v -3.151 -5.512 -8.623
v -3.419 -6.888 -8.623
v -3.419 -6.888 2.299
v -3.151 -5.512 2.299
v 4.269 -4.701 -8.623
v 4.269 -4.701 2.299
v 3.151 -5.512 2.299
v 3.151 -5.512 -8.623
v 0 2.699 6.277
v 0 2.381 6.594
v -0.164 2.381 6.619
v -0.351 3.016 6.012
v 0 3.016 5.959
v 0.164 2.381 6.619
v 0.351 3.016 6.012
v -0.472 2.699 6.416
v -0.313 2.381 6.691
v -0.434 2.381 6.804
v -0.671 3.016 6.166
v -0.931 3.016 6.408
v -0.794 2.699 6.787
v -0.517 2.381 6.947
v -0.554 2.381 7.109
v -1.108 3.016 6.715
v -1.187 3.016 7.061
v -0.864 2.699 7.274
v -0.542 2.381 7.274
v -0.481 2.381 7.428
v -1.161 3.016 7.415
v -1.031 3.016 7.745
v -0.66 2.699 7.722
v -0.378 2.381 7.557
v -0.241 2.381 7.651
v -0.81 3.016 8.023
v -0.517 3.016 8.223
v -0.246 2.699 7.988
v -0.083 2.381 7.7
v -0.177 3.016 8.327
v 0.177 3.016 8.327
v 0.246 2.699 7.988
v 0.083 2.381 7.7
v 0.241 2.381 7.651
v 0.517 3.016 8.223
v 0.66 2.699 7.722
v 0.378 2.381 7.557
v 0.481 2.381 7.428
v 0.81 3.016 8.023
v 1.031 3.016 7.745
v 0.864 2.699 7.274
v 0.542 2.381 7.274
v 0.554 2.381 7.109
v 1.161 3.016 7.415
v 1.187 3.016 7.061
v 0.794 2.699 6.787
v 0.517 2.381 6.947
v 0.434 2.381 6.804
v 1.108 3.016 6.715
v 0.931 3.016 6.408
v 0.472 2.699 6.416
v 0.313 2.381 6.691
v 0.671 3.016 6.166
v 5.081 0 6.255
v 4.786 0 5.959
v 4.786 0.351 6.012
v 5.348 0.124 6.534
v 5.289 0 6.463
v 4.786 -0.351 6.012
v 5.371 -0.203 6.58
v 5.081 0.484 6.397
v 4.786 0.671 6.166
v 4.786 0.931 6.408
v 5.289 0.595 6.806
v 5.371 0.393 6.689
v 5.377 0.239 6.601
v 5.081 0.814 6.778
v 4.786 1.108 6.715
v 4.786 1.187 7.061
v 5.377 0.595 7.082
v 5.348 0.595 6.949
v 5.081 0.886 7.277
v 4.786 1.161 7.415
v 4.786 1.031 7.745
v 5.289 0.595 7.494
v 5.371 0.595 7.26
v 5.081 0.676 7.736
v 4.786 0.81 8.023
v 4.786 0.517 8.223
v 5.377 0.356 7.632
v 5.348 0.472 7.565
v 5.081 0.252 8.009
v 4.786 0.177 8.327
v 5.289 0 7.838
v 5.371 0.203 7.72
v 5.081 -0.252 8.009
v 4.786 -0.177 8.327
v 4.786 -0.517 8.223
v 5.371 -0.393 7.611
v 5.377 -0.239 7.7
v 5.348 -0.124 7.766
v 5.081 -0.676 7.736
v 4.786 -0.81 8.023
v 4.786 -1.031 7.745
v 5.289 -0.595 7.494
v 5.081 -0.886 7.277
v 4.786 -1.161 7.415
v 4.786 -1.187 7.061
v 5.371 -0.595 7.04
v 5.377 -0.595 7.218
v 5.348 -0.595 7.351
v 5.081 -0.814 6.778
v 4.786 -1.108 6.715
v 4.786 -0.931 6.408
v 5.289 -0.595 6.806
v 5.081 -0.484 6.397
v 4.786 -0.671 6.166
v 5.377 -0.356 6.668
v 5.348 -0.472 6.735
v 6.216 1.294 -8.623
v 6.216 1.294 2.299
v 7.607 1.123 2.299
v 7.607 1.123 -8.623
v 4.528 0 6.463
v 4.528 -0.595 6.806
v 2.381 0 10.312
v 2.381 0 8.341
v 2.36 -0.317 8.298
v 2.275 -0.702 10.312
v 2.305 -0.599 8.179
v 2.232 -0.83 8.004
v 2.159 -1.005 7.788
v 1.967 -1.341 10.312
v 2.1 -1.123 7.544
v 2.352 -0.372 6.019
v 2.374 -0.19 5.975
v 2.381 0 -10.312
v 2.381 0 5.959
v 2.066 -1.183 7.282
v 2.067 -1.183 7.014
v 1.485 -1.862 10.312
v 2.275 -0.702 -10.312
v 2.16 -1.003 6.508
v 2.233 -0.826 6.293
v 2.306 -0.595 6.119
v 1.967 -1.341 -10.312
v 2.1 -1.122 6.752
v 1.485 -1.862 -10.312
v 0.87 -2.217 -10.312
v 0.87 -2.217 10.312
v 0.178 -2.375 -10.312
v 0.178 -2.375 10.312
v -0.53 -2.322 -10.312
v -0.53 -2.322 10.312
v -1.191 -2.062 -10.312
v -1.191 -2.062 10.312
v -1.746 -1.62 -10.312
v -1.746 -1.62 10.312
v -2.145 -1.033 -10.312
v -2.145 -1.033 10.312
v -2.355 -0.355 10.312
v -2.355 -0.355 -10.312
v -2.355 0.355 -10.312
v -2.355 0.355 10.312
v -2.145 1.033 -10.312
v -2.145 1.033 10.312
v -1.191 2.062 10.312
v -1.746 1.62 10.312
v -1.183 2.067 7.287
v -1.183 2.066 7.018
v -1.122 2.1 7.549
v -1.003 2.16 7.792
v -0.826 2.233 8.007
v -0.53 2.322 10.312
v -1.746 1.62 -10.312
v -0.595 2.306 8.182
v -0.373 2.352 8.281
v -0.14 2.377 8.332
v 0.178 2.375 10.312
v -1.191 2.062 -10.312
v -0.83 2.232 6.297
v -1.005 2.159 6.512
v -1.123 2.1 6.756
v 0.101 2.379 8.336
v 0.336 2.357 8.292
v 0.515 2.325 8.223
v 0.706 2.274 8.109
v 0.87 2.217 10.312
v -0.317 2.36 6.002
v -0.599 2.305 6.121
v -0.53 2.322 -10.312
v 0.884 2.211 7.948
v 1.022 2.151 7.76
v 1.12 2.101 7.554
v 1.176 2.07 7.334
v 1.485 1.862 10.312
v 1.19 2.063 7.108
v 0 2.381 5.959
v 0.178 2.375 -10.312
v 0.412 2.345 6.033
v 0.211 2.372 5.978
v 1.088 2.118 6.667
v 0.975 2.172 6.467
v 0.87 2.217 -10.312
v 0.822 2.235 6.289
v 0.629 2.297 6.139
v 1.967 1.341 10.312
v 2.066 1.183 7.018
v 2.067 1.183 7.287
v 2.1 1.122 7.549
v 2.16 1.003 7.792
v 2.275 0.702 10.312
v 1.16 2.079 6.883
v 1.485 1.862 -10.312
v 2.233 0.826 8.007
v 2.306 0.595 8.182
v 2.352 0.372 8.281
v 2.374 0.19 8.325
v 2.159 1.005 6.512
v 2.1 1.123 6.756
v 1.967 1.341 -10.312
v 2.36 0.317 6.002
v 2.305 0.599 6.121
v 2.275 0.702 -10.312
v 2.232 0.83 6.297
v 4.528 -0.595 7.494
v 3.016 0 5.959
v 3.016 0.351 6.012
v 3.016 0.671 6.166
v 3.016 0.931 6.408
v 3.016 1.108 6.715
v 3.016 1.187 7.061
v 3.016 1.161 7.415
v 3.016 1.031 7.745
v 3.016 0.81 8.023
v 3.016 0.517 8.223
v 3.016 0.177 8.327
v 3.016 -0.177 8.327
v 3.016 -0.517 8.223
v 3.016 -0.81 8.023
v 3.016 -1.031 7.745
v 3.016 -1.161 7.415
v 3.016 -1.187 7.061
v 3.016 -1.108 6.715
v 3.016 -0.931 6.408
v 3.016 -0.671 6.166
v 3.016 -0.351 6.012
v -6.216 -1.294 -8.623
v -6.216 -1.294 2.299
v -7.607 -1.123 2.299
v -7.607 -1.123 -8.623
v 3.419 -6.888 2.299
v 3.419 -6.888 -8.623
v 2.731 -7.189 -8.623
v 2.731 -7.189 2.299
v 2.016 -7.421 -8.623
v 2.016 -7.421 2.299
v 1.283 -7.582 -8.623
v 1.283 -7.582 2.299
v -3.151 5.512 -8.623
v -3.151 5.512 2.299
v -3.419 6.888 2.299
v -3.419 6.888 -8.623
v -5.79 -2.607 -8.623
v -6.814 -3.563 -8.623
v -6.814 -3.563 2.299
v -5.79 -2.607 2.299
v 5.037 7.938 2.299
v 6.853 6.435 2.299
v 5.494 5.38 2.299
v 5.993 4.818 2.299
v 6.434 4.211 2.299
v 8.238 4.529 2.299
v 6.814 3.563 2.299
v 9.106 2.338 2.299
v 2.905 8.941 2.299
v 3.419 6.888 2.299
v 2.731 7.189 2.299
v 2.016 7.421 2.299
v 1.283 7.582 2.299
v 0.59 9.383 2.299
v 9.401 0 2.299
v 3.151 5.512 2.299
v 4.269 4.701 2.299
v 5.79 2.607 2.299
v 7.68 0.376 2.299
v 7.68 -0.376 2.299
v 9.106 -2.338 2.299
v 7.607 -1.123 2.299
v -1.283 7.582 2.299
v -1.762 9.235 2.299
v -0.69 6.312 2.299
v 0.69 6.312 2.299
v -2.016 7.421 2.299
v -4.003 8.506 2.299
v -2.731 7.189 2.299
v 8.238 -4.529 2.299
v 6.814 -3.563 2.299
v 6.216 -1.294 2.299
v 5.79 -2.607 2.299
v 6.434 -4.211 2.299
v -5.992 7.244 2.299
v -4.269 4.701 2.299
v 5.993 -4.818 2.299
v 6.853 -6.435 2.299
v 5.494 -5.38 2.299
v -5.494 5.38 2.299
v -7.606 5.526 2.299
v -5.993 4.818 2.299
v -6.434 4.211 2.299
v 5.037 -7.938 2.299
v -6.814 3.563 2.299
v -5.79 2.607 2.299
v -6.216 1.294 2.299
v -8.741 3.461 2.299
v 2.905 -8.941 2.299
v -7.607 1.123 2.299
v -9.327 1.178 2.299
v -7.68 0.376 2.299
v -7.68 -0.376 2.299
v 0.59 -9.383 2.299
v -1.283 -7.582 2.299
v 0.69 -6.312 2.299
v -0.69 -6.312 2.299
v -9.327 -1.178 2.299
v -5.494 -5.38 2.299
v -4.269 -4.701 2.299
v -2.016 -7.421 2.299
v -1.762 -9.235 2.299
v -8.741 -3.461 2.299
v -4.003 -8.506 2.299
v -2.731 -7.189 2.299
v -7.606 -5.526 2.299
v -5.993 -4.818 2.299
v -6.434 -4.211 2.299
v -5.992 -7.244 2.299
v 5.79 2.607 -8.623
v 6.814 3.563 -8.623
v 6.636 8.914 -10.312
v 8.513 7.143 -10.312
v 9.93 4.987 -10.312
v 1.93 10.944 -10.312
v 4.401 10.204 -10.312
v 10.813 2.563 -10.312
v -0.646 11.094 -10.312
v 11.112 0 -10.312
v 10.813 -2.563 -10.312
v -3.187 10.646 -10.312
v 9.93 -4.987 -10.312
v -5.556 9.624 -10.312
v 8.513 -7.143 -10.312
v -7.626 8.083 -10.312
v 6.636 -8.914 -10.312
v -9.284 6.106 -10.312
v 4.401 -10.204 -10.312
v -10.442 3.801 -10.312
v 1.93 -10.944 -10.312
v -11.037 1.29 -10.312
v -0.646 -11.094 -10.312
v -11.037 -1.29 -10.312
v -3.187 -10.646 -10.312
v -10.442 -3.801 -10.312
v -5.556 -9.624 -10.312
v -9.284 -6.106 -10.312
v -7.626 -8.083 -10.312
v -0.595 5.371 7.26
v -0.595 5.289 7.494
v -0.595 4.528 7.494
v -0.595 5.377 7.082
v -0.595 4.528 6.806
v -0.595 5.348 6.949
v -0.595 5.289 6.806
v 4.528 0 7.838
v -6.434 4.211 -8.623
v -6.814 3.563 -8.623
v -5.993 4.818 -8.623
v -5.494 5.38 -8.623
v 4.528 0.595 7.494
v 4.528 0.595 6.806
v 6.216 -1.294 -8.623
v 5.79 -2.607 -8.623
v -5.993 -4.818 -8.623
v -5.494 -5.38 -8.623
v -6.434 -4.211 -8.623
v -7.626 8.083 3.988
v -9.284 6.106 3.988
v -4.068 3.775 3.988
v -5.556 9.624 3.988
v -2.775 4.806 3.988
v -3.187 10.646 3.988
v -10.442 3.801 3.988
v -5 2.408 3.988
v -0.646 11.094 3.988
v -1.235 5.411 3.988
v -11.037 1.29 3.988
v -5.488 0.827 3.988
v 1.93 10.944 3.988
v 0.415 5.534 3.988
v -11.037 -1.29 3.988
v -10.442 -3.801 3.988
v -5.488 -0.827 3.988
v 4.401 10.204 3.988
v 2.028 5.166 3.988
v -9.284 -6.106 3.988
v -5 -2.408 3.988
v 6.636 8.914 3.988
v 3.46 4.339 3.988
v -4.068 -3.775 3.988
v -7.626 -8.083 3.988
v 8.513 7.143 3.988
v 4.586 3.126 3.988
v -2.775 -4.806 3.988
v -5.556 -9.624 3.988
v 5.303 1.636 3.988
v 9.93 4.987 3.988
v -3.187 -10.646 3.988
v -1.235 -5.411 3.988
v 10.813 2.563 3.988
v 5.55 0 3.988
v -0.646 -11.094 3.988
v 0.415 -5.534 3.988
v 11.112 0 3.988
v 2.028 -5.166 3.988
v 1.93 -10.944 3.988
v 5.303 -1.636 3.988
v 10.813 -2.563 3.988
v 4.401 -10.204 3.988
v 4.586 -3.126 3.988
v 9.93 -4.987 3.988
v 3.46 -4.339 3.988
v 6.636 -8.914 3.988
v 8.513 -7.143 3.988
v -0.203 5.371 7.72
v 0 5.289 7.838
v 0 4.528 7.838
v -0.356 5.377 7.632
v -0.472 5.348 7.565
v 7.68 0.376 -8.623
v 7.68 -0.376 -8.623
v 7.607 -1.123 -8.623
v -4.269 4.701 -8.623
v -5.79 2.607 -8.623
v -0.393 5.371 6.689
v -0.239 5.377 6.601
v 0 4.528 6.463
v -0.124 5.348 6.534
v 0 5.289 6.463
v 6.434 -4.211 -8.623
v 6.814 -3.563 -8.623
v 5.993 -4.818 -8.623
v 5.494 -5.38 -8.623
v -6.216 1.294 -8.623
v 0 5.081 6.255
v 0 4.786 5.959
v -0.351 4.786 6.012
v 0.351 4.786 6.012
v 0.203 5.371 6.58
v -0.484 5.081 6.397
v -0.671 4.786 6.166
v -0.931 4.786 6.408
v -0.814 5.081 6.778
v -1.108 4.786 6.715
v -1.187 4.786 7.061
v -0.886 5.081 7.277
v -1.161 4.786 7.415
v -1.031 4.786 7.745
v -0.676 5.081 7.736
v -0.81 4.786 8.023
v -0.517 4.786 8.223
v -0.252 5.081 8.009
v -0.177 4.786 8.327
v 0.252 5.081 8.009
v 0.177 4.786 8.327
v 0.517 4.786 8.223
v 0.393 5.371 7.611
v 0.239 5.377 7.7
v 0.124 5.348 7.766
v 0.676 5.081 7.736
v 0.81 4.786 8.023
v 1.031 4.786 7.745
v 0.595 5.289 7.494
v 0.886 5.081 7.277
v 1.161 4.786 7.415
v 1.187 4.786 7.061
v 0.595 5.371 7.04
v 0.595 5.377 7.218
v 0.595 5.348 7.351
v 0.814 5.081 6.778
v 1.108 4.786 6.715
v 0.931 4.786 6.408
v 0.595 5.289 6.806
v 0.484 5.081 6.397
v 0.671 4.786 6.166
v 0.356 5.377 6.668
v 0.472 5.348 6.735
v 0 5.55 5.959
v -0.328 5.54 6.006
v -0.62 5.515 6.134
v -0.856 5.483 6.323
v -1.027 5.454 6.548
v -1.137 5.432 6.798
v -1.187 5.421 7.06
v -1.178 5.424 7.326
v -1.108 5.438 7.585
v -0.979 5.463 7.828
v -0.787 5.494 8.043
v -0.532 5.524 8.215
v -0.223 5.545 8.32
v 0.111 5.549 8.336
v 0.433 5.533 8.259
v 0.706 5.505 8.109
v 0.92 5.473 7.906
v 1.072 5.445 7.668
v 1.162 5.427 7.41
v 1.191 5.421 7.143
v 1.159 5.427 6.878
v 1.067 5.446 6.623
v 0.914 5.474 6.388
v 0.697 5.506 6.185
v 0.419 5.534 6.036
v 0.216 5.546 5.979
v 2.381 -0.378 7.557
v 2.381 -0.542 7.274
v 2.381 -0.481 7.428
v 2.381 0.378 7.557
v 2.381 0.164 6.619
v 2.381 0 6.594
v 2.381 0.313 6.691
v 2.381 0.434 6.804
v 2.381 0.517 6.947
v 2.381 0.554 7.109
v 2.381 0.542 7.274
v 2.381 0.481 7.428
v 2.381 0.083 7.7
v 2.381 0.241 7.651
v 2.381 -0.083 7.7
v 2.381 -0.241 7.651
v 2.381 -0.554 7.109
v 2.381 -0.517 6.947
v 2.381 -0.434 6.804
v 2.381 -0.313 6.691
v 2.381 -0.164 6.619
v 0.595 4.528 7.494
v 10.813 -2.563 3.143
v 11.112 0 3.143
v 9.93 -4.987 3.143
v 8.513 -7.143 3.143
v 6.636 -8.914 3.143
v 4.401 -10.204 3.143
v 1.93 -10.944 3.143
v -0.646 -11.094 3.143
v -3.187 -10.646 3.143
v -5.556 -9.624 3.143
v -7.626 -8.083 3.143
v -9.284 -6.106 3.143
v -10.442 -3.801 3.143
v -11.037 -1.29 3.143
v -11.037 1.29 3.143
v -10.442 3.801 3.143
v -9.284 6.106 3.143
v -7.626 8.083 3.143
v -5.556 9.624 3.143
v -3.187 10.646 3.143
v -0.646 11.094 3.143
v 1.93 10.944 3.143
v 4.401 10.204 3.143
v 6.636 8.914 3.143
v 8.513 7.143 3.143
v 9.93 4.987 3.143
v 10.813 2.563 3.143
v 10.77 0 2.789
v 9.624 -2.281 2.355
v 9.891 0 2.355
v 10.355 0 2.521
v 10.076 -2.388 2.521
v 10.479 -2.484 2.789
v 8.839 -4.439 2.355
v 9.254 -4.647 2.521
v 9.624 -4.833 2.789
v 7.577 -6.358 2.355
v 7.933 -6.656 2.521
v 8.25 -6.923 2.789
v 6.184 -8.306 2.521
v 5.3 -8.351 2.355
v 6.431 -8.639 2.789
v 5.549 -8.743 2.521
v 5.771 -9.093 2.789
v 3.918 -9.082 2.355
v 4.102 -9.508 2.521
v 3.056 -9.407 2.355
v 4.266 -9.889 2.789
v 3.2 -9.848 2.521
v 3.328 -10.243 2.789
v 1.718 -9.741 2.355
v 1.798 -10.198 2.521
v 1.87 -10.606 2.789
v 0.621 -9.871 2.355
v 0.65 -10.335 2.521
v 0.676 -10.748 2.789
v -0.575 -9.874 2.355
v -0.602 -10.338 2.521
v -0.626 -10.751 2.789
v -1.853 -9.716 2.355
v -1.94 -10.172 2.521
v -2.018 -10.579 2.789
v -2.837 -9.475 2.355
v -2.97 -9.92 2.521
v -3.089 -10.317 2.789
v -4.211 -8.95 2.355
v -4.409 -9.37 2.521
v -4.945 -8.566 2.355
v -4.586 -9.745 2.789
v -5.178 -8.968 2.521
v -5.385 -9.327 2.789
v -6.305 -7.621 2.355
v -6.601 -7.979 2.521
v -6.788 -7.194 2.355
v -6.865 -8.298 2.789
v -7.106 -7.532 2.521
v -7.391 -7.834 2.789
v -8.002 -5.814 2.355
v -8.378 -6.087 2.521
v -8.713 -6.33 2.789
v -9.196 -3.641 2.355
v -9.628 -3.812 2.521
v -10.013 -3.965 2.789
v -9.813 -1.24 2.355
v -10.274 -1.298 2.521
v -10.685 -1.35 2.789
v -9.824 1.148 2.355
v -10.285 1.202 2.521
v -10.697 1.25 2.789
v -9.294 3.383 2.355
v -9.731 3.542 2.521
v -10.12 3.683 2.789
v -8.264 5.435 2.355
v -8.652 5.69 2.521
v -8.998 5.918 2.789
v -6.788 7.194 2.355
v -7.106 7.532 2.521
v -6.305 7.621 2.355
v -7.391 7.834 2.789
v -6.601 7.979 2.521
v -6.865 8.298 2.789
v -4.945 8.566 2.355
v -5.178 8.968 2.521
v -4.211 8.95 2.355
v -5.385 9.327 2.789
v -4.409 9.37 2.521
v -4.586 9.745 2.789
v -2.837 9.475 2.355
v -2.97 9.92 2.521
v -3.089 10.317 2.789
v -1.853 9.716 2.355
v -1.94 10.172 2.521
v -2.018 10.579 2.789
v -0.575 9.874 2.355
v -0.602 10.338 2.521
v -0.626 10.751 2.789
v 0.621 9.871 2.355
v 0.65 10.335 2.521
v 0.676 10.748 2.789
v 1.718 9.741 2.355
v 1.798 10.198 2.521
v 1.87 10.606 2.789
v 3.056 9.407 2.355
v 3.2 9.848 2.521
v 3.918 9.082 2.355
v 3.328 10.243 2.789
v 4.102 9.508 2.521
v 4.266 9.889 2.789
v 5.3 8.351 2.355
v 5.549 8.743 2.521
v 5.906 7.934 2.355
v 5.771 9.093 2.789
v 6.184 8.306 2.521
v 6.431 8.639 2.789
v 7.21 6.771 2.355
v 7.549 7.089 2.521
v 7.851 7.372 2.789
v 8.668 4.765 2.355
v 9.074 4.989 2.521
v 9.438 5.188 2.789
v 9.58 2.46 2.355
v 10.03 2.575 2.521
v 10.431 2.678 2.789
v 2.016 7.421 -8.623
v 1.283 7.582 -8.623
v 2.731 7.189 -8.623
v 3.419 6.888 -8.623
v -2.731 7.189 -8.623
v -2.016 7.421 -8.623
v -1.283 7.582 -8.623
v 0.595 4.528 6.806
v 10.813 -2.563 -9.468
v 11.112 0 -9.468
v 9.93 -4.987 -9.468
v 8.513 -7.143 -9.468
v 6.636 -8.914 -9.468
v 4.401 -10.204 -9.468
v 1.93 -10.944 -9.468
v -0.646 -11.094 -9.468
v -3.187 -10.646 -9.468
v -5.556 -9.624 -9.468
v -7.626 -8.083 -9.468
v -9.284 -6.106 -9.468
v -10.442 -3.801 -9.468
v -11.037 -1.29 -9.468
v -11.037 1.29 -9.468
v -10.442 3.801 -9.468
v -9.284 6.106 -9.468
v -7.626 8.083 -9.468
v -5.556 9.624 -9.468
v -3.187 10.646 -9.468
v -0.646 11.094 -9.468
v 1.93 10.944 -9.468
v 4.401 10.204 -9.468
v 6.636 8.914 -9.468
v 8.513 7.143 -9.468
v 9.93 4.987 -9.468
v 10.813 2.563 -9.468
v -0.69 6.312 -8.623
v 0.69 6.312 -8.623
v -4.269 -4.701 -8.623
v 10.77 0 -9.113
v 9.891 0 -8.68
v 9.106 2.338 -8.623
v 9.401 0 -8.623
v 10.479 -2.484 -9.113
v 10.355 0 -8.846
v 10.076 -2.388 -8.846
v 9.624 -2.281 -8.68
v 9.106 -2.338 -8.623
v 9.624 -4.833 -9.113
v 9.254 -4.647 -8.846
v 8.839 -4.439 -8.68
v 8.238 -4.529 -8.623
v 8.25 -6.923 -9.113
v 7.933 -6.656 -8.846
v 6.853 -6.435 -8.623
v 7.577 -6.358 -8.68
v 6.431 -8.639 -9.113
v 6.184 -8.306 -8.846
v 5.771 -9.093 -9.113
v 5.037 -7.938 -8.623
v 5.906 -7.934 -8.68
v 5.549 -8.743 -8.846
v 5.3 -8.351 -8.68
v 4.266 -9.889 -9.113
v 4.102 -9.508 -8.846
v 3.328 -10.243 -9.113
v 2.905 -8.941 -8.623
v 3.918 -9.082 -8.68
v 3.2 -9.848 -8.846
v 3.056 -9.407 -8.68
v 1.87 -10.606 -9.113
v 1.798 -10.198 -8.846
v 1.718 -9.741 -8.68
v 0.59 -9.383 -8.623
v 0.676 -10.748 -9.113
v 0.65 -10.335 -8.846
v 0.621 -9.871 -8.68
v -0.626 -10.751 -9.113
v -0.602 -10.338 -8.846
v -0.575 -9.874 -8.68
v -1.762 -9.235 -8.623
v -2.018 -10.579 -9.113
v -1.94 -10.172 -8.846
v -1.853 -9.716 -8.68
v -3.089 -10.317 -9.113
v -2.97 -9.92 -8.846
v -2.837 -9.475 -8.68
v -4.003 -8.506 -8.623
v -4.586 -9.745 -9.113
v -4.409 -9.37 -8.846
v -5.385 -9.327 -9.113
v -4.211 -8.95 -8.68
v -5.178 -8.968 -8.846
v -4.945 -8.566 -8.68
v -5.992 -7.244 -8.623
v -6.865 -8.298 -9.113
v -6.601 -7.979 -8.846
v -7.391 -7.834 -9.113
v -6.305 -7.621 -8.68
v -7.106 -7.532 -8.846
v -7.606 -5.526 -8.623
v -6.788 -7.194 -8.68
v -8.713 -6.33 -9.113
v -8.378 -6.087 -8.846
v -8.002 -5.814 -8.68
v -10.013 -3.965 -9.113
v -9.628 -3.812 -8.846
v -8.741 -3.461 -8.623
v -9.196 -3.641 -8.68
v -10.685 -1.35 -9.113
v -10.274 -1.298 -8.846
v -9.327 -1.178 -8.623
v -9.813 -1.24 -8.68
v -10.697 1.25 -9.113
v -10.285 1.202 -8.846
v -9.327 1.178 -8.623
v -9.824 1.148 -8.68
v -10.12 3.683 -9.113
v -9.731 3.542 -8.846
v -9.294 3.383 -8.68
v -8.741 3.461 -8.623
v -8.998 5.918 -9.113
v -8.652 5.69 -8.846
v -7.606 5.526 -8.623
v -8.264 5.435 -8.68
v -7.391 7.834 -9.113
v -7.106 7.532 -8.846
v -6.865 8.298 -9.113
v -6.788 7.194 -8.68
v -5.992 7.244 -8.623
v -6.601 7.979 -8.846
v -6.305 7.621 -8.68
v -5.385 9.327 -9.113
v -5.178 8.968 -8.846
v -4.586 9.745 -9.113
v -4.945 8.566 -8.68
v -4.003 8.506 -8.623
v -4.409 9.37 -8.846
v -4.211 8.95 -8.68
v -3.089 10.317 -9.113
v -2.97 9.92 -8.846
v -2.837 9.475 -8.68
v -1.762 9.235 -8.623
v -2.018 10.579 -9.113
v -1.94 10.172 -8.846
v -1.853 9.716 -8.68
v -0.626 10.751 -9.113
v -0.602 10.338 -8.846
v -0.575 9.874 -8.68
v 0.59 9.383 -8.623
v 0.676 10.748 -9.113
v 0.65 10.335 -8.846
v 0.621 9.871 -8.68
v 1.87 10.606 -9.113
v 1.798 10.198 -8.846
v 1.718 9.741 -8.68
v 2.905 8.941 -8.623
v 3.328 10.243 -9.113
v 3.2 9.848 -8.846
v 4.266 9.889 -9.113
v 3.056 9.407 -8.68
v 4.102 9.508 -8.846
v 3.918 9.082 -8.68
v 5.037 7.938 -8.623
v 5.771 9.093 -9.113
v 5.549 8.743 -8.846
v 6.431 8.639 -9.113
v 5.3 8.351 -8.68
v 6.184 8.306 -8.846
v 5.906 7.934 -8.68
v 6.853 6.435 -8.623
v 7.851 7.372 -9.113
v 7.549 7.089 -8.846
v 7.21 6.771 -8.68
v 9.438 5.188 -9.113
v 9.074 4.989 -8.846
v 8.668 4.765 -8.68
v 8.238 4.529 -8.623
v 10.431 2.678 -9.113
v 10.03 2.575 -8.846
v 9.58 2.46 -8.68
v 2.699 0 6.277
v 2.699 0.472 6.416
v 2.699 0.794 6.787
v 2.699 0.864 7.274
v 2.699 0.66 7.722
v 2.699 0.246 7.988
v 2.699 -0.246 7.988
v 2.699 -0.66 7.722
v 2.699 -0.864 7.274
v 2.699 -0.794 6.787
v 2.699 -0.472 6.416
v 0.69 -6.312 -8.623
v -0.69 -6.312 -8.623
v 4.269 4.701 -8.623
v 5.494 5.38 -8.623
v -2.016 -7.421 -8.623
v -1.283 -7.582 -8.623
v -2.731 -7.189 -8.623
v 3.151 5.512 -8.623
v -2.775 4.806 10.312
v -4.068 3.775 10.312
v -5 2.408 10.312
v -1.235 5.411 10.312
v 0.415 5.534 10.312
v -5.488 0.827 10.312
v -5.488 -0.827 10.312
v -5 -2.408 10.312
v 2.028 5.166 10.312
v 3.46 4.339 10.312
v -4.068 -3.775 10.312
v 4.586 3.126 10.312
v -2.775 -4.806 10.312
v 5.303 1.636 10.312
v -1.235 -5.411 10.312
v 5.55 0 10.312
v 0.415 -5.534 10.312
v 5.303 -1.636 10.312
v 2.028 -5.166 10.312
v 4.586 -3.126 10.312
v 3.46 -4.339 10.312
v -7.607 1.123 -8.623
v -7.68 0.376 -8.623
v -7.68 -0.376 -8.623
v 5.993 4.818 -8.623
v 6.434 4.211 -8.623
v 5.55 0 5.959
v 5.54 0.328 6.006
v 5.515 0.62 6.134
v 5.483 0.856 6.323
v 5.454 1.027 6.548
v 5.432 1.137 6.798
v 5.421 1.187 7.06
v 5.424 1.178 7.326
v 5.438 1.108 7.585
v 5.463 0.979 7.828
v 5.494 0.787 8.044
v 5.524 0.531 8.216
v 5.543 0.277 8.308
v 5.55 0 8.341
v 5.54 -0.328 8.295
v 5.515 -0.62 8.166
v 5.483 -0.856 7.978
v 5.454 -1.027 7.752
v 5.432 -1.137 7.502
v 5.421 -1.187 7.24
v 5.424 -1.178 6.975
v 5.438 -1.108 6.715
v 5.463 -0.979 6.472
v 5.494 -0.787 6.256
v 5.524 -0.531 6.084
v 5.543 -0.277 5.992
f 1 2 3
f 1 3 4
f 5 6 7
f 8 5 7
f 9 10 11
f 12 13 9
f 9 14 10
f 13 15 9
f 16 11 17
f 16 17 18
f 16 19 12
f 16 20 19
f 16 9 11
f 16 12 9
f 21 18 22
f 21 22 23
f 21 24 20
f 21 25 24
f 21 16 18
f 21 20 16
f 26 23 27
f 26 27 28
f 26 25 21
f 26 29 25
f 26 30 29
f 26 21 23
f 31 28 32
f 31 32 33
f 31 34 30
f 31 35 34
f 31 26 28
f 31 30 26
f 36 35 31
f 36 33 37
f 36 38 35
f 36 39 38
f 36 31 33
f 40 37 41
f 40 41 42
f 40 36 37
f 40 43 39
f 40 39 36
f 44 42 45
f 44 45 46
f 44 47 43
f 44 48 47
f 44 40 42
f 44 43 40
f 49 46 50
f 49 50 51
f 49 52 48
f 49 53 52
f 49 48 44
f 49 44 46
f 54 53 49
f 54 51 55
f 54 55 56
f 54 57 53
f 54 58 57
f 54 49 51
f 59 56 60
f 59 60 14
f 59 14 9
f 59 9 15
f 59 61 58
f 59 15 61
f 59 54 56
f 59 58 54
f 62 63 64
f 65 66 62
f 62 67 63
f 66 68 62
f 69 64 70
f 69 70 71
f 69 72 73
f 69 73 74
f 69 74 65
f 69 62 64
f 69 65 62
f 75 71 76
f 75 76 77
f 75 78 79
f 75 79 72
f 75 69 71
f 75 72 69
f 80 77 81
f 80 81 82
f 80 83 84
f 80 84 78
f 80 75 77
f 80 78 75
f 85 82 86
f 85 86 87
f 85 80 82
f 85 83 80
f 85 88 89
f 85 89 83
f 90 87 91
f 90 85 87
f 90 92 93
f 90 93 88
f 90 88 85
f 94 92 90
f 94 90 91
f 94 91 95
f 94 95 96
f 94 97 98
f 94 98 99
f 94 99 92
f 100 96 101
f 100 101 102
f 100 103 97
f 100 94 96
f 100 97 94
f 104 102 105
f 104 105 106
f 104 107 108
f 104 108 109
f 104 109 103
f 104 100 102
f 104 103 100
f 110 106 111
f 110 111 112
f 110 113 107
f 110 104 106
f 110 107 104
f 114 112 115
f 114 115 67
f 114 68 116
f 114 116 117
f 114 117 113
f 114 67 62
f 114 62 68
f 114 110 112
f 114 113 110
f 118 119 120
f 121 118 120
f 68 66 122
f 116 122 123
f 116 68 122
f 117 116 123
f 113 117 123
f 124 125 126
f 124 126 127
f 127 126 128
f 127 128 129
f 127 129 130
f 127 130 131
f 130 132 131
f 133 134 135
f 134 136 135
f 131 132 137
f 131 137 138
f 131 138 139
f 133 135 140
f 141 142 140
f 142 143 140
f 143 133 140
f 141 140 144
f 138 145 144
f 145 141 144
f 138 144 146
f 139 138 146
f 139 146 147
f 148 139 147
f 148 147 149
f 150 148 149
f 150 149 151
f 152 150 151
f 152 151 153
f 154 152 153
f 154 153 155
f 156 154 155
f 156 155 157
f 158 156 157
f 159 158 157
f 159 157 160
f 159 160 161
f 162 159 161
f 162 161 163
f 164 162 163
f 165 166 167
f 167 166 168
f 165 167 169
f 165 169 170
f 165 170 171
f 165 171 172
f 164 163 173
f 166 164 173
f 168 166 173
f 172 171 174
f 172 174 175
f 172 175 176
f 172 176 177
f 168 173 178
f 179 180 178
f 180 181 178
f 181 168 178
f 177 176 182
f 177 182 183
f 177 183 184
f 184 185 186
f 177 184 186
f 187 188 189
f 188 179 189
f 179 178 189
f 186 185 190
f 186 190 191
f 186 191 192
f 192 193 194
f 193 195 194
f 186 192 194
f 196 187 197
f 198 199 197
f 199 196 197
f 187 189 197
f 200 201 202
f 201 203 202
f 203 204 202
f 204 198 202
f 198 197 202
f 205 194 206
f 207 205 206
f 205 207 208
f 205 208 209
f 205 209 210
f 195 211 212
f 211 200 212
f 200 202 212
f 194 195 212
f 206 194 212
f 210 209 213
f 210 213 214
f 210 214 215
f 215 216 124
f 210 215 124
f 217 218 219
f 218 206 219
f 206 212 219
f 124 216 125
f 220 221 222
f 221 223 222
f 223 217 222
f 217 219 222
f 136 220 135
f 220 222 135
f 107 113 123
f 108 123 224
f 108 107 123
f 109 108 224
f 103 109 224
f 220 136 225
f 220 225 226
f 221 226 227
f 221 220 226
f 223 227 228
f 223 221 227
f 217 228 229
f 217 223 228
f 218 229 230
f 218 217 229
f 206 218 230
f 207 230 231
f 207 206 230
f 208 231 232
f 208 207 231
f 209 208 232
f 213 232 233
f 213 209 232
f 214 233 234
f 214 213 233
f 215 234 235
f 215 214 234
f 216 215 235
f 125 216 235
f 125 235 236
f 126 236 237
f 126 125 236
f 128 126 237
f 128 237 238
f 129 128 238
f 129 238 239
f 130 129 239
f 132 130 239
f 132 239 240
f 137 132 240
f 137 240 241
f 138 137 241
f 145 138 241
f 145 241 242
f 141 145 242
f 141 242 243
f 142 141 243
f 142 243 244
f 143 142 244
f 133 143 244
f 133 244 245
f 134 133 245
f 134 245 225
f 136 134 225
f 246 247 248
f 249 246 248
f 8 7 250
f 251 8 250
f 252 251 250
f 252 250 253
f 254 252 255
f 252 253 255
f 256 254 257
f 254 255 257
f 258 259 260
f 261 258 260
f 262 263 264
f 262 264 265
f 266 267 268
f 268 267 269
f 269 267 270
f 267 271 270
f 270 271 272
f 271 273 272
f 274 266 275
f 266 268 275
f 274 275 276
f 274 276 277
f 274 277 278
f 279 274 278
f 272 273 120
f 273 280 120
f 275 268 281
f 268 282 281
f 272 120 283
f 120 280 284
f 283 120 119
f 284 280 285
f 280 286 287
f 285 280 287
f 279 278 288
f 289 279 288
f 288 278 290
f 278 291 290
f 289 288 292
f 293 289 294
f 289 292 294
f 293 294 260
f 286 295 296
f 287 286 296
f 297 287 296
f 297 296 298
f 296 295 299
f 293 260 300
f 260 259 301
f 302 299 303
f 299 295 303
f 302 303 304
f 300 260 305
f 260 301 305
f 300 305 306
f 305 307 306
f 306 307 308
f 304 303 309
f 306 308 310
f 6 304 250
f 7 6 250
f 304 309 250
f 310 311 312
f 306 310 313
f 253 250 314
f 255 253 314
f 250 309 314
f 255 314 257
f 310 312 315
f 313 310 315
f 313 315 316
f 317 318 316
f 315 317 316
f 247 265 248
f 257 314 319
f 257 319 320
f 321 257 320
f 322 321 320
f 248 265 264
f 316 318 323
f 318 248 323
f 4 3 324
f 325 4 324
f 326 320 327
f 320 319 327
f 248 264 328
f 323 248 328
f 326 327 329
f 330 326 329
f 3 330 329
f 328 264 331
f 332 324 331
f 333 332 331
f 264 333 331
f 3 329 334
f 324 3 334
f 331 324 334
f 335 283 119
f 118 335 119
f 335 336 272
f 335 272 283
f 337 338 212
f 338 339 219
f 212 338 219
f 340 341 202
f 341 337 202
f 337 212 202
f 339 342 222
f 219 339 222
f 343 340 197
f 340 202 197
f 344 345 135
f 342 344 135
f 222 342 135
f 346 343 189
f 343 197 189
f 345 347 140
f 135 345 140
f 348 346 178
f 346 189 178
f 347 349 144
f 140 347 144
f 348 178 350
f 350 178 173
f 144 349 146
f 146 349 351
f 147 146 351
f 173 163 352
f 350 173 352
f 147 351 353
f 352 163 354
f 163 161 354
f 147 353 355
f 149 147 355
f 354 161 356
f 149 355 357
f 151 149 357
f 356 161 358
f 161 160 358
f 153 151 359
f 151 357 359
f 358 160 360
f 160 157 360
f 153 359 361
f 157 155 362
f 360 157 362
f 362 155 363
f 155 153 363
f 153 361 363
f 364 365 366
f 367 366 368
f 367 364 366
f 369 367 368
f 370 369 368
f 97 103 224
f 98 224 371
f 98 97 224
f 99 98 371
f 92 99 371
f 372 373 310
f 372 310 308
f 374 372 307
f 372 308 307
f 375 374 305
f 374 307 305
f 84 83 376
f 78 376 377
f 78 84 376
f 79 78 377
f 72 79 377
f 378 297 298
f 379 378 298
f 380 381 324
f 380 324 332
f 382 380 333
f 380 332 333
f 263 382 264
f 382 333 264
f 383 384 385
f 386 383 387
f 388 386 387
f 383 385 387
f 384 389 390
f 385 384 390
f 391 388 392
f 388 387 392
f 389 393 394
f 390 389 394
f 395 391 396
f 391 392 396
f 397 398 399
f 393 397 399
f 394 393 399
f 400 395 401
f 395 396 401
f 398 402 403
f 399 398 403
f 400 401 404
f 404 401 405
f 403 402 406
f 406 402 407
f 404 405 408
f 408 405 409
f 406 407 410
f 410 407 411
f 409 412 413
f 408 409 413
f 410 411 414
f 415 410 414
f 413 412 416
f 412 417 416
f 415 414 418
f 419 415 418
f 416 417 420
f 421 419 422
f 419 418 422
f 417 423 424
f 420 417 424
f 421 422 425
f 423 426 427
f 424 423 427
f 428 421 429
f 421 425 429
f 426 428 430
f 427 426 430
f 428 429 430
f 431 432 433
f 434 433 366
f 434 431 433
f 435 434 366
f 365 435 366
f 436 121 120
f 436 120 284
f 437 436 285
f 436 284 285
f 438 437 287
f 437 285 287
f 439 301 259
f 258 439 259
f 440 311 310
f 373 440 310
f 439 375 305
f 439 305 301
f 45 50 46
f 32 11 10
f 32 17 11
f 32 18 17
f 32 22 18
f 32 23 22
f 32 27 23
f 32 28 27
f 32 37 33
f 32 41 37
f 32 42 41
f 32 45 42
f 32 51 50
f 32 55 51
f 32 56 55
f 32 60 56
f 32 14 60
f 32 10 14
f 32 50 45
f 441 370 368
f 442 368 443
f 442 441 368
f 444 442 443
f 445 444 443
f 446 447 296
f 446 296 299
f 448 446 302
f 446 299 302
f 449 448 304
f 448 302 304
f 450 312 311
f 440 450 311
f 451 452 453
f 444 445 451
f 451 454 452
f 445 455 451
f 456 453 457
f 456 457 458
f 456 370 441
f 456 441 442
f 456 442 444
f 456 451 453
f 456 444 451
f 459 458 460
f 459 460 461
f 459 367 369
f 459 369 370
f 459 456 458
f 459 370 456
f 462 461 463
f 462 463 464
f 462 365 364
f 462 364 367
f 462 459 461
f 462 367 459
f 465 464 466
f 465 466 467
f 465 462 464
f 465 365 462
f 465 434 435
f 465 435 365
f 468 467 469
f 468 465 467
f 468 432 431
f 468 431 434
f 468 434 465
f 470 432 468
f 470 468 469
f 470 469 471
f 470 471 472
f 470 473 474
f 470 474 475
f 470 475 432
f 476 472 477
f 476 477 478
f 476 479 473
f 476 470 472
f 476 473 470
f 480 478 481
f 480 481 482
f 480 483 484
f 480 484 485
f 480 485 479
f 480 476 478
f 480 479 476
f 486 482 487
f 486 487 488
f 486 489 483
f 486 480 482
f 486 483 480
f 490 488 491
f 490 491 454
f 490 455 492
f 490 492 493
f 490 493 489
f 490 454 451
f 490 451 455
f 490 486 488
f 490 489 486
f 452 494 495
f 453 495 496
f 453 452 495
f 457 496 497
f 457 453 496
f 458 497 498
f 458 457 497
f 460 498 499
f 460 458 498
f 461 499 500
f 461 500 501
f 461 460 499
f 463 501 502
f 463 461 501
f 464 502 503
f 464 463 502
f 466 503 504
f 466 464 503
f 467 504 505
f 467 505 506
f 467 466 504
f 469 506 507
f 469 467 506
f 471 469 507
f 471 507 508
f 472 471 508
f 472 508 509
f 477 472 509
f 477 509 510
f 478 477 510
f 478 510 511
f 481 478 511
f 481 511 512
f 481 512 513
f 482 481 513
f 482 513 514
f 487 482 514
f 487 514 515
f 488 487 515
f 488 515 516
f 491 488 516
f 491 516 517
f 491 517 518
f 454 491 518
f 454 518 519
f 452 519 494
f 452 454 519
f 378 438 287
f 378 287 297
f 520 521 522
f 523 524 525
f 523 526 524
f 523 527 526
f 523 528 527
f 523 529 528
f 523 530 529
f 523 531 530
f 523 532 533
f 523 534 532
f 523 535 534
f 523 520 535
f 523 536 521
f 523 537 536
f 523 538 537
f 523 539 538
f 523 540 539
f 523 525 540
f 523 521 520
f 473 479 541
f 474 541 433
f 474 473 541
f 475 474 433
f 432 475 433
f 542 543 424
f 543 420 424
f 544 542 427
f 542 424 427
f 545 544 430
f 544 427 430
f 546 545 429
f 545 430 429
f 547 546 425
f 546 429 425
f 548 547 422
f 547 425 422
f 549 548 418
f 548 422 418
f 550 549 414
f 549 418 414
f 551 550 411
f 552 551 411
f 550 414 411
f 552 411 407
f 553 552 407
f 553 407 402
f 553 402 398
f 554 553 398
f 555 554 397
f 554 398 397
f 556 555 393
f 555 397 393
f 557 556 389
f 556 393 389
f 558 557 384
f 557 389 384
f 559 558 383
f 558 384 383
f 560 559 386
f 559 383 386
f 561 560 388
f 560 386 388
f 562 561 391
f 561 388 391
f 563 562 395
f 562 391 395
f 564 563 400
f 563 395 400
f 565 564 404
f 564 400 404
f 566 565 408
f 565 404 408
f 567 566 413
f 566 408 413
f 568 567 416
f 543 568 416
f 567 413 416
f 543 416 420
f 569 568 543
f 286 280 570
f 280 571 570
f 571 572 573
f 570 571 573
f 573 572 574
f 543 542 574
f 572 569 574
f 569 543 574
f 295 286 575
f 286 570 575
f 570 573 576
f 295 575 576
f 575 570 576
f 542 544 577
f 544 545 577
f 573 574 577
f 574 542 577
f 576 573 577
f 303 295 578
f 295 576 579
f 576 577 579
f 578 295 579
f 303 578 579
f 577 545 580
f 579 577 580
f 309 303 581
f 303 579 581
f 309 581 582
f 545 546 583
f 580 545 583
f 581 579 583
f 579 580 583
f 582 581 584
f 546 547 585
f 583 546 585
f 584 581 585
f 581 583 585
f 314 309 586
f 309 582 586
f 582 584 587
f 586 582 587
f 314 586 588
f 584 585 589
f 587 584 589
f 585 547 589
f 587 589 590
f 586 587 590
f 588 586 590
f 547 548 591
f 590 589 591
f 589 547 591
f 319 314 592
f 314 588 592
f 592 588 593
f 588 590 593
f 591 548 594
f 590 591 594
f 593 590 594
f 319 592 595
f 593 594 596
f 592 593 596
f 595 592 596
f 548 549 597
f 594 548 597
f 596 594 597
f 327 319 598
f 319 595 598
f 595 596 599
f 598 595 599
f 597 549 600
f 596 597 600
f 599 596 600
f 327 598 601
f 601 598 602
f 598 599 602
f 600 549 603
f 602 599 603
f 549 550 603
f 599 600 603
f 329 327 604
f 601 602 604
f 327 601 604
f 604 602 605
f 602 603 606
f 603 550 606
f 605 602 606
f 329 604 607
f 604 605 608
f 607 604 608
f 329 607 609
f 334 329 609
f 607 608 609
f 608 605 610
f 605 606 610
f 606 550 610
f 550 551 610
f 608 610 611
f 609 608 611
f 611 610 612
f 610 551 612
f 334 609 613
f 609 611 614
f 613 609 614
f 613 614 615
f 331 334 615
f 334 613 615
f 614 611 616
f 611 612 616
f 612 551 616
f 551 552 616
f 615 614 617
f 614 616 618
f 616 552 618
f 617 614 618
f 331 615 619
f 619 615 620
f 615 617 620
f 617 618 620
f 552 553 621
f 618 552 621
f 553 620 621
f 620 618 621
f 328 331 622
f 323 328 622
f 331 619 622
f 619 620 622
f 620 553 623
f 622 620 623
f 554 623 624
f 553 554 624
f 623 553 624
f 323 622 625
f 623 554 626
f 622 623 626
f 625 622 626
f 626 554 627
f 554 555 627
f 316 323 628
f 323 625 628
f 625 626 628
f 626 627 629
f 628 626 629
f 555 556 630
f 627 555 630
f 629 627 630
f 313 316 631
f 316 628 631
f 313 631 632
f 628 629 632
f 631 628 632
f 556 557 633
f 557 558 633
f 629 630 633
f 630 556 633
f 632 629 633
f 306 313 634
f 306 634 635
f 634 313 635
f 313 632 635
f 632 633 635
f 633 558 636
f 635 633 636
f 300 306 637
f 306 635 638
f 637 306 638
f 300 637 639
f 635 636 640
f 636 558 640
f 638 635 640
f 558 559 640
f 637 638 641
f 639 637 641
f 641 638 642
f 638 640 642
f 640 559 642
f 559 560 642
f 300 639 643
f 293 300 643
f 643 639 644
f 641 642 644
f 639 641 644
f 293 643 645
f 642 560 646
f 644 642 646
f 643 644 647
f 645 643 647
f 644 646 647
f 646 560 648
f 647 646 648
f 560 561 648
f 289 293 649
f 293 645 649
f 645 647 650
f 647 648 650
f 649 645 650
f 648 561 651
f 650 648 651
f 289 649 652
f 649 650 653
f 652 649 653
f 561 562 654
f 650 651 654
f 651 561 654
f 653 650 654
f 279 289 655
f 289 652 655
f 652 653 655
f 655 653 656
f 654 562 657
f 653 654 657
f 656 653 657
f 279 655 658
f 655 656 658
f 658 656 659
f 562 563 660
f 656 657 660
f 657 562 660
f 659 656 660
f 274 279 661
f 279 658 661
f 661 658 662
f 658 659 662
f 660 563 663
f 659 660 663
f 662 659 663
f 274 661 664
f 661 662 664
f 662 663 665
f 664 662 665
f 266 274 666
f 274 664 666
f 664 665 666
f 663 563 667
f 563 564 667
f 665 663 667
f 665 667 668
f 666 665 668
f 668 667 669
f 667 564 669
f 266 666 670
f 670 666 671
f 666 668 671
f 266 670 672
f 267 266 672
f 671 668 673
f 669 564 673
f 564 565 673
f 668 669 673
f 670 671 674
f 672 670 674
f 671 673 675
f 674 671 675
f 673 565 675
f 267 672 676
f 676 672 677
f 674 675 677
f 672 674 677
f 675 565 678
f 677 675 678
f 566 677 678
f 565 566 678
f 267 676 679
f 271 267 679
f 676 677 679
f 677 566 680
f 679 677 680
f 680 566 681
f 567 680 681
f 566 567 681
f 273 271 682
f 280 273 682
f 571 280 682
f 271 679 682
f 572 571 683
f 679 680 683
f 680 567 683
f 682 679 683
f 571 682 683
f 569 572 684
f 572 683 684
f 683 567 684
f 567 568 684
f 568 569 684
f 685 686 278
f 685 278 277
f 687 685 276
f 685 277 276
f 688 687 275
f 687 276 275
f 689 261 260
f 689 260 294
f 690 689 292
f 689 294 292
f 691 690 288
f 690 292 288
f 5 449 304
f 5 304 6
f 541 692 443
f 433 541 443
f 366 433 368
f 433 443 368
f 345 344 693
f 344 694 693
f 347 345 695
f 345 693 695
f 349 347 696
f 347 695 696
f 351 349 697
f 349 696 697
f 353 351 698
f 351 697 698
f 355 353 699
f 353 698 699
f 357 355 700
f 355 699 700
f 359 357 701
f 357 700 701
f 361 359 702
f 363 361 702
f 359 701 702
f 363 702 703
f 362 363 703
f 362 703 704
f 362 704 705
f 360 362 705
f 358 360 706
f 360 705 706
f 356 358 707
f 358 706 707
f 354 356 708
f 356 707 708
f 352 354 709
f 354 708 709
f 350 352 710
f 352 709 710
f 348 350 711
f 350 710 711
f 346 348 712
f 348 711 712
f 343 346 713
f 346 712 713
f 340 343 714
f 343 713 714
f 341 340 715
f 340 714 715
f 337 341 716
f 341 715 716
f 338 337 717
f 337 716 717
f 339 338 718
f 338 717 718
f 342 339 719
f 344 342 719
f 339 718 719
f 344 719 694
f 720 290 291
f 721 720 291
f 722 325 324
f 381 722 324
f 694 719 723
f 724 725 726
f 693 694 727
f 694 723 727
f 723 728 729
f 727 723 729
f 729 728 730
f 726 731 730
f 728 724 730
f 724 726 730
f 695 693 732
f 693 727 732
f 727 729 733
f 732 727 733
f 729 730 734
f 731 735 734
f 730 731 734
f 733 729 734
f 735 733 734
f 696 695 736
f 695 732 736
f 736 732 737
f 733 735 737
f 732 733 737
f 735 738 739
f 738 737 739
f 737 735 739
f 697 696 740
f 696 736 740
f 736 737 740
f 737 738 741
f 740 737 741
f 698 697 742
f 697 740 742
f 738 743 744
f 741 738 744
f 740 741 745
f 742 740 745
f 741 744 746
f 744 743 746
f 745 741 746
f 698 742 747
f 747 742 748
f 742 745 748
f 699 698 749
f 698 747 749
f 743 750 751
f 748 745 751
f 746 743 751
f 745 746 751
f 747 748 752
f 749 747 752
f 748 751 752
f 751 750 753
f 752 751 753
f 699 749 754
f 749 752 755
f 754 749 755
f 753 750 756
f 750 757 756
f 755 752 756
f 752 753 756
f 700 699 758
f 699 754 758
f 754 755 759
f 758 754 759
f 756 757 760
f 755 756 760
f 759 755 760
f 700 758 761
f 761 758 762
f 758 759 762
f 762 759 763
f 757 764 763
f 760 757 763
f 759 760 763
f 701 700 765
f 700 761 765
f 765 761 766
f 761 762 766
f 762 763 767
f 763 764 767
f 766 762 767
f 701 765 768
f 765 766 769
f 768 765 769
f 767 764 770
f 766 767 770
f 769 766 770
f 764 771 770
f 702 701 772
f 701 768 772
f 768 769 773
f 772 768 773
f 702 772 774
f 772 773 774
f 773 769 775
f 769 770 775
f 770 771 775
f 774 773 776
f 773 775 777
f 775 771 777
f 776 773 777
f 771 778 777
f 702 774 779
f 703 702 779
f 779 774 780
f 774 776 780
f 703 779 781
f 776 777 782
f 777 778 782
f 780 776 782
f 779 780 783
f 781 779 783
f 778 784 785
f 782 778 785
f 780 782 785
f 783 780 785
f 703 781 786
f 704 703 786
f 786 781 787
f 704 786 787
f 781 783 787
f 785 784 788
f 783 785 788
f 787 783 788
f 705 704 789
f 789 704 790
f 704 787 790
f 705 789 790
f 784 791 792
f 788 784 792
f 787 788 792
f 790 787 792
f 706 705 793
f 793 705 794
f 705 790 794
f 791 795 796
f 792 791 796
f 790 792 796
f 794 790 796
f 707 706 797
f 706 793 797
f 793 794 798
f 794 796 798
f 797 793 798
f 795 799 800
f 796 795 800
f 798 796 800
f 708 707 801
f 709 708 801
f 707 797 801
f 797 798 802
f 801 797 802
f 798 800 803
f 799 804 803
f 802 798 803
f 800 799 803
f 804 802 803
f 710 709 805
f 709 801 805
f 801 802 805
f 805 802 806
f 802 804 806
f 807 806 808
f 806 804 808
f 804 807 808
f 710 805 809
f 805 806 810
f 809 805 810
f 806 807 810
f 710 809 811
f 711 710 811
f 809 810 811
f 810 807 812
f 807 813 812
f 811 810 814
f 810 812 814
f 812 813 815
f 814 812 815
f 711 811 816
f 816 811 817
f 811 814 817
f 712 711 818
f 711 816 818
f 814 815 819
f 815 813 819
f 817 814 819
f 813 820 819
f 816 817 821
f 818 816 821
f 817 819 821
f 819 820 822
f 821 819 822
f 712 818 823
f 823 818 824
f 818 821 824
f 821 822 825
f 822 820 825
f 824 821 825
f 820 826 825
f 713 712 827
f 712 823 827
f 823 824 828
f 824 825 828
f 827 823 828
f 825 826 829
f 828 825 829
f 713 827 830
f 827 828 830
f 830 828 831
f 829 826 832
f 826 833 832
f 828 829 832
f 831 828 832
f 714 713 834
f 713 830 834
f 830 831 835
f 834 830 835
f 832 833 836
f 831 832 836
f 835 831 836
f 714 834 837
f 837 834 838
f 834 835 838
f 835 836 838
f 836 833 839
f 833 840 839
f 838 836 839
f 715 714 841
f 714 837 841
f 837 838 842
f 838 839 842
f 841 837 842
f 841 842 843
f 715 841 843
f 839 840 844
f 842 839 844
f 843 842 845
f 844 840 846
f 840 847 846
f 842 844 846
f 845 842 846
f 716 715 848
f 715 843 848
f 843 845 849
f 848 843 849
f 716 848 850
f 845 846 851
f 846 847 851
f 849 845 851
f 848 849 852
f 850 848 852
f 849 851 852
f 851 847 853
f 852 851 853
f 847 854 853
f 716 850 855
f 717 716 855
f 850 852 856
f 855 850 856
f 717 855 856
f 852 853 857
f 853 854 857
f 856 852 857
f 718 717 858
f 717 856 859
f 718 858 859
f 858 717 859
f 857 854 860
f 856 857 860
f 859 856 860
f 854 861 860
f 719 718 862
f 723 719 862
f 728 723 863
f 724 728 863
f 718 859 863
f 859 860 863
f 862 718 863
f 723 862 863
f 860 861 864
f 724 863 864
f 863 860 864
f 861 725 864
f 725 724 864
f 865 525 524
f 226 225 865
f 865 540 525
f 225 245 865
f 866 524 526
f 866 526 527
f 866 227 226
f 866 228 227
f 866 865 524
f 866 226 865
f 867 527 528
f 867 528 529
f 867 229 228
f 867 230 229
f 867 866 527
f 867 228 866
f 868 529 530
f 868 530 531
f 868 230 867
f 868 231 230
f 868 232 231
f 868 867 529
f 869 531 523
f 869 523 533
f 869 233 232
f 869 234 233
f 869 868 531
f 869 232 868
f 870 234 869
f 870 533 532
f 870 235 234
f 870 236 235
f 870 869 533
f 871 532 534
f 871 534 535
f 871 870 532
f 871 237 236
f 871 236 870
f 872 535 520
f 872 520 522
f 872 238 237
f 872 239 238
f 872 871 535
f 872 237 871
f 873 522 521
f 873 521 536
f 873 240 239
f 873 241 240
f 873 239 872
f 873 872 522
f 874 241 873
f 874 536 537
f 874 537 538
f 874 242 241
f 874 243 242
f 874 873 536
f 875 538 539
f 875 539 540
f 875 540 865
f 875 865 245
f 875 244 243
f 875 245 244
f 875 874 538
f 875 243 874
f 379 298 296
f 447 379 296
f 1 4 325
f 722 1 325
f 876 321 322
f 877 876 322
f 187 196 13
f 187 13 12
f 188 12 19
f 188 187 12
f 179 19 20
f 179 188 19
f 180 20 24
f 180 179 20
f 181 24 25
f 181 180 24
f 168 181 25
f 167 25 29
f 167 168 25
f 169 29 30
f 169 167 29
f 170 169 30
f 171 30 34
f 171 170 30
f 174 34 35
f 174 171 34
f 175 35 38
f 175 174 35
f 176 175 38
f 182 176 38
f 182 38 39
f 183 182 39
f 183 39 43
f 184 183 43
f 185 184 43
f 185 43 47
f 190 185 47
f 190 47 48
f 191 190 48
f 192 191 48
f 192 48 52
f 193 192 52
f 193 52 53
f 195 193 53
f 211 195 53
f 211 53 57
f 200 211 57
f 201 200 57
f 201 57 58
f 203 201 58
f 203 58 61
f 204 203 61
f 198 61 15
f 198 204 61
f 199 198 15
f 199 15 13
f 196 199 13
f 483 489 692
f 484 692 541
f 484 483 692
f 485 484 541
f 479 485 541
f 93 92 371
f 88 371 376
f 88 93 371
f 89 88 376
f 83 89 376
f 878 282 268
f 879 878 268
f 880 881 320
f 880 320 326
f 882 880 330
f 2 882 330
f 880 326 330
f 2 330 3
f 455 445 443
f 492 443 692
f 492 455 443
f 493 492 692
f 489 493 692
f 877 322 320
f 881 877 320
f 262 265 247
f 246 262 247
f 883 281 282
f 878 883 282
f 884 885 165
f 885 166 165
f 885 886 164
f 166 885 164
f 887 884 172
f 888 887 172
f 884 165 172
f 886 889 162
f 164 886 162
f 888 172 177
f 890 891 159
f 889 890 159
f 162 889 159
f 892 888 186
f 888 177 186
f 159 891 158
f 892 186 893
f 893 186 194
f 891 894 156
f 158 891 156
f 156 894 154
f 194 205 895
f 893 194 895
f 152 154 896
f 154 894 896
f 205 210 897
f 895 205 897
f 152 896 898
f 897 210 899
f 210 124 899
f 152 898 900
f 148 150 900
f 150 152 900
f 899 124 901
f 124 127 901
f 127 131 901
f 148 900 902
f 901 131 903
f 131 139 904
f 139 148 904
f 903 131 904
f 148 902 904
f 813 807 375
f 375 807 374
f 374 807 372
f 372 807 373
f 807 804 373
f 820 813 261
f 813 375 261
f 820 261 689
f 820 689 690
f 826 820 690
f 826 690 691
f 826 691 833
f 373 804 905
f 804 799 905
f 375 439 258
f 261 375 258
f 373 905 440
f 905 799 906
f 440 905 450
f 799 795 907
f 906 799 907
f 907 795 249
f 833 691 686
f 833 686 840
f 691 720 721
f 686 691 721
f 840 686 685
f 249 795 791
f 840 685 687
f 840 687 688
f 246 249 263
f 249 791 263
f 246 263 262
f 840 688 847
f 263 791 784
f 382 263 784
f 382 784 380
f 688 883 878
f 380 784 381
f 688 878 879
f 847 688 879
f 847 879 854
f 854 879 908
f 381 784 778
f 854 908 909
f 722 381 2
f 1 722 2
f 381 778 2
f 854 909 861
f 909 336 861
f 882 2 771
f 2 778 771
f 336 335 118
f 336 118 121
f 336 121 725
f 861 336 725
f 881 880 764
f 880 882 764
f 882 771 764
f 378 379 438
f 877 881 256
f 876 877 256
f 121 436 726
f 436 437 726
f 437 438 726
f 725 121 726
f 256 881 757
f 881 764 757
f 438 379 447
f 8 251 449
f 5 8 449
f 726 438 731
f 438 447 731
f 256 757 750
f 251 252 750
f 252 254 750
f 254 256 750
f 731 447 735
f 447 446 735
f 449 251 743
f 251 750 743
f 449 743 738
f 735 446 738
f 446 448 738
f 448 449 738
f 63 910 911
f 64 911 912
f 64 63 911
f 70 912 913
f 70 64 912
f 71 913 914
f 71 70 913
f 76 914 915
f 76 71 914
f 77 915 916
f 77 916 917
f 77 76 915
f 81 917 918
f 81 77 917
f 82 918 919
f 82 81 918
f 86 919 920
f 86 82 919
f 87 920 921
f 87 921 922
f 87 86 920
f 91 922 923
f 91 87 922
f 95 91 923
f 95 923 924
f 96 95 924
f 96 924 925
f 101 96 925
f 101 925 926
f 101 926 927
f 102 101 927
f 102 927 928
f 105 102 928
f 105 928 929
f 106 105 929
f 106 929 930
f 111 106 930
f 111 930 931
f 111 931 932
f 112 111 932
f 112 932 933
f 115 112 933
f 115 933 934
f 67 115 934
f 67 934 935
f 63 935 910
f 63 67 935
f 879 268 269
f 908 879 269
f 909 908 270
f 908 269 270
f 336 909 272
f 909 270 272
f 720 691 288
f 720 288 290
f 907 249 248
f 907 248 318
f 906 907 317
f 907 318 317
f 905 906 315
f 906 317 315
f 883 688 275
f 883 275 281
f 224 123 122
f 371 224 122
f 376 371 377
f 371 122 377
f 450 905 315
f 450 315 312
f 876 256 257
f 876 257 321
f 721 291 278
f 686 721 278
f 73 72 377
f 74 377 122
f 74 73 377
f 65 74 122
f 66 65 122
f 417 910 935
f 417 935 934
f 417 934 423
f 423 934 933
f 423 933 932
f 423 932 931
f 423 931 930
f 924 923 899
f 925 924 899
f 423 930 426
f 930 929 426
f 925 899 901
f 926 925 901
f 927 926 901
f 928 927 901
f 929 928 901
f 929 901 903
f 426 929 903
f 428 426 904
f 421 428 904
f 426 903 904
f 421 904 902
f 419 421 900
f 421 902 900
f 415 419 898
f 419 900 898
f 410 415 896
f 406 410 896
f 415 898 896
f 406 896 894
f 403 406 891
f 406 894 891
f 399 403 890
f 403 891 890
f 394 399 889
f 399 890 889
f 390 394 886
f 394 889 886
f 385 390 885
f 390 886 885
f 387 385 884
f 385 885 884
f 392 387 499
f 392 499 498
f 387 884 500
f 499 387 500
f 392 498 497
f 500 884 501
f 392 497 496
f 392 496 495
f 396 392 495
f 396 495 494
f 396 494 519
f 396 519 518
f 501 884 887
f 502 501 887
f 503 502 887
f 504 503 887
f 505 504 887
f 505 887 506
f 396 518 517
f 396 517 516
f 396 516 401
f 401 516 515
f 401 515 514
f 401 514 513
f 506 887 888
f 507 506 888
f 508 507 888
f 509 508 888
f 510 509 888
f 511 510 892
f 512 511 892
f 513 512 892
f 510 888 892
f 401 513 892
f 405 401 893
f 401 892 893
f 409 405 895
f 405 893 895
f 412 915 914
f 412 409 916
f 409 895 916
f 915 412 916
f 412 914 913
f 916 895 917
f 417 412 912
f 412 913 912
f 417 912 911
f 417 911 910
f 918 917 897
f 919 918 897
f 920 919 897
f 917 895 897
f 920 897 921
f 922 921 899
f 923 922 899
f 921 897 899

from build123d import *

# Parameters (mm, degrees)
CUT_EXTRUDE1_START = 2.2987
CUT_EXTRUDE1_DEPTH = 10.922
CIRPATTERN1_COUNT  = 10
SKETCH4_R          = 1.190625
CUT_EXTRUDE2_DEPTH = 19.796832346
CUT_EXTRUDE3_DEPTH = 0.89296875
CIRPATTERN2_COUNT  = 2
CIRPATTERN2_ANGLE  = 90


with BuildPart() as part:
    # Sketch2 → Revolve1 (revolve)
    with BuildSketch(Plane(origin=(0, 0, 0), x_dir=(0, 0, -1), z_dir=(1, 0, 0)), mode=Mode.PRIVATE) as revolve1_sk:
        with BuildLine():
            Line((-10.3124, 2.38125), (10.3124, 2.38125))
            Line((10.3124, 2.38125), (10.3124, 11.1125))
            Line((10.3124, 11.1125), (9.46785, 11.1125))
            ThreePointArc((9.46785, 11.1125), (8.84593021, 10.355304295), (8.6233, 9.401068816))
            Line((8.6233, 9.401068816), (8.6233, 7.689637631))
            Line((8.6233, 7.689637631), (-2.2987, 7.689637631))
            Line((-2.2987, 7.689637631), (-2.2987, 9.401068816))
            ThreePointArc((-2.2987, 9.401068816), (-2.52133021, 10.355304295), (-3.14325, 11.1125))
            Line((-3.14325, 11.1125), (-3.9878, 11.1125))
            Line((-3.9878, 11.1125), (-3.9878, 5.5499))
            Line((-3.9878, 5.5499), (-10.3124, 5.5499))
            Line((-10.3124, 5.5499), (-10.3124, 2.38125))
        make_face()
    revolve(revolve1_sk.sketch.rotate(Axis((0, 0, 10.3124), (0, 0, -1)), 90), axis=Axis((0, 0, 10.3124), (0, 0, -1)))

    # Sketch3 → Cut-Extrude1 (cut)
    with BuildSketch(Plane.XY.offset(CUT_EXTRUDE1_START)):
        with BuildLine():
            Line((-0.690489274, 6.3119), (0.690489274, 6.3119))
            Line((0.690489274, 6.3119), (1.2827, 7.5819))
            ThreePointArc((1.2827, 7.5819), (0, 7.689637631), (-1.2827, 7.5819))
            Line((-1.2827, 7.5819), (-0.690489274, 6.3119))
        make_face()
    cut_extrude1 = extrude(amount=-CUT_EXTRUDE1_DEPTH, mode=Mode.SUBTRACT)

    # CirPattern1: Cut-Extrude1 ×10 about axis
    cirpattern1_axis = Axis((0, 0, 0), (0, 0, 1))
    for i in range(1, CIRPATTERN1_COUNT):
        add(cut_extrude1.rotate(cirpattern1_axis, i * 360 / CIRPATTERN1_COUNT), mode=Mode.SUBTRACT)

    # Sketch4 → Cut-Extrude2 (cut, through all)
    with BuildSketch(Plane(origin=(0, 0, 0), x_dir=(1, 0, 0), z_dir=(0, 1, 0))):
        with Locations(Location((0, -7.1501, 0), (0, 0, 90))):
            Circle(SKETCH4_R)
    cut_extrude2 = extrude(amount=CUT_EXTRUDE2_DEPTH, mode=Mode.SUBTRACT)

    # Sketch5 → Revolve2 (revolve)
    with BuildSketch(Plane.XY.offset(7.1501), mode=Mode.PRIVATE) as revolve2_sk:
        Polygon((0, 5.420682809), (0, 2.38125), (-0.555625, 2.38125), (-1.190625, 3.01625), (-1.190625, 4.785682809), (-0.555625, 5.420682809), align=None)
    revolve2 = revolve(revolve2_sk.sketch.rotate(Axis((0, 0, 7.1501), (0, 1, 0)), 270), axis=Axis((0, 0, 7.1501), (0, 1, 0)))

    # Sketch6 → Cut-Extrude3 (cut)
    with BuildSketch(Plane(origin=(0, 5.420682809, 0), x_dir=(-1, 0, 0), z_dir=(0, -1, 0))):
        Polygon((0, -6.462692336), (-0.5953125, -6.806396168), (-0.5953125, -7.493803832), (0, -7.837507664), (0.5953125, -7.493803832), (0.5953125, -6.806396168), align=None)
    cut_extrude3 = extrude(amount=CUT_EXTRUDE3_DEPTH, mode=Mode.SUBTRACT)

    # CirPattern2: Cut-Extrude2, Revolve2, Cut-Extrude3 ×2 about axis
    cirpattern2_axis = Axis((0, 0, 0), (0, 0, -1))
    add([cut_extrude2.rotate(cirpattern2_axis, i * CIRPATTERN2_ANGLE / (CIRPATTERN2_COUNT - 1)) for i in range(1, CIRPATTERN2_COUNT)], mode=Mode.SUBTRACT)
    add([revolve2.rotate(cirpattern2_axis, i * CIRPATTERN2_ANGLE / (CIRPATTERN2_COUNT - 1)) for i in range(1, CIRPATTERN2_COUNT)])
    add([cut_extrude3.rotate(cirpattern2_axis, i * CIRPATTERN2_ANGLE / (CIRPATTERN2_COUNT - 1)) for i in range(1, CIRPATTERN2_COUNT)], mode=Mode.SUBTRACT)


solid = part.part
